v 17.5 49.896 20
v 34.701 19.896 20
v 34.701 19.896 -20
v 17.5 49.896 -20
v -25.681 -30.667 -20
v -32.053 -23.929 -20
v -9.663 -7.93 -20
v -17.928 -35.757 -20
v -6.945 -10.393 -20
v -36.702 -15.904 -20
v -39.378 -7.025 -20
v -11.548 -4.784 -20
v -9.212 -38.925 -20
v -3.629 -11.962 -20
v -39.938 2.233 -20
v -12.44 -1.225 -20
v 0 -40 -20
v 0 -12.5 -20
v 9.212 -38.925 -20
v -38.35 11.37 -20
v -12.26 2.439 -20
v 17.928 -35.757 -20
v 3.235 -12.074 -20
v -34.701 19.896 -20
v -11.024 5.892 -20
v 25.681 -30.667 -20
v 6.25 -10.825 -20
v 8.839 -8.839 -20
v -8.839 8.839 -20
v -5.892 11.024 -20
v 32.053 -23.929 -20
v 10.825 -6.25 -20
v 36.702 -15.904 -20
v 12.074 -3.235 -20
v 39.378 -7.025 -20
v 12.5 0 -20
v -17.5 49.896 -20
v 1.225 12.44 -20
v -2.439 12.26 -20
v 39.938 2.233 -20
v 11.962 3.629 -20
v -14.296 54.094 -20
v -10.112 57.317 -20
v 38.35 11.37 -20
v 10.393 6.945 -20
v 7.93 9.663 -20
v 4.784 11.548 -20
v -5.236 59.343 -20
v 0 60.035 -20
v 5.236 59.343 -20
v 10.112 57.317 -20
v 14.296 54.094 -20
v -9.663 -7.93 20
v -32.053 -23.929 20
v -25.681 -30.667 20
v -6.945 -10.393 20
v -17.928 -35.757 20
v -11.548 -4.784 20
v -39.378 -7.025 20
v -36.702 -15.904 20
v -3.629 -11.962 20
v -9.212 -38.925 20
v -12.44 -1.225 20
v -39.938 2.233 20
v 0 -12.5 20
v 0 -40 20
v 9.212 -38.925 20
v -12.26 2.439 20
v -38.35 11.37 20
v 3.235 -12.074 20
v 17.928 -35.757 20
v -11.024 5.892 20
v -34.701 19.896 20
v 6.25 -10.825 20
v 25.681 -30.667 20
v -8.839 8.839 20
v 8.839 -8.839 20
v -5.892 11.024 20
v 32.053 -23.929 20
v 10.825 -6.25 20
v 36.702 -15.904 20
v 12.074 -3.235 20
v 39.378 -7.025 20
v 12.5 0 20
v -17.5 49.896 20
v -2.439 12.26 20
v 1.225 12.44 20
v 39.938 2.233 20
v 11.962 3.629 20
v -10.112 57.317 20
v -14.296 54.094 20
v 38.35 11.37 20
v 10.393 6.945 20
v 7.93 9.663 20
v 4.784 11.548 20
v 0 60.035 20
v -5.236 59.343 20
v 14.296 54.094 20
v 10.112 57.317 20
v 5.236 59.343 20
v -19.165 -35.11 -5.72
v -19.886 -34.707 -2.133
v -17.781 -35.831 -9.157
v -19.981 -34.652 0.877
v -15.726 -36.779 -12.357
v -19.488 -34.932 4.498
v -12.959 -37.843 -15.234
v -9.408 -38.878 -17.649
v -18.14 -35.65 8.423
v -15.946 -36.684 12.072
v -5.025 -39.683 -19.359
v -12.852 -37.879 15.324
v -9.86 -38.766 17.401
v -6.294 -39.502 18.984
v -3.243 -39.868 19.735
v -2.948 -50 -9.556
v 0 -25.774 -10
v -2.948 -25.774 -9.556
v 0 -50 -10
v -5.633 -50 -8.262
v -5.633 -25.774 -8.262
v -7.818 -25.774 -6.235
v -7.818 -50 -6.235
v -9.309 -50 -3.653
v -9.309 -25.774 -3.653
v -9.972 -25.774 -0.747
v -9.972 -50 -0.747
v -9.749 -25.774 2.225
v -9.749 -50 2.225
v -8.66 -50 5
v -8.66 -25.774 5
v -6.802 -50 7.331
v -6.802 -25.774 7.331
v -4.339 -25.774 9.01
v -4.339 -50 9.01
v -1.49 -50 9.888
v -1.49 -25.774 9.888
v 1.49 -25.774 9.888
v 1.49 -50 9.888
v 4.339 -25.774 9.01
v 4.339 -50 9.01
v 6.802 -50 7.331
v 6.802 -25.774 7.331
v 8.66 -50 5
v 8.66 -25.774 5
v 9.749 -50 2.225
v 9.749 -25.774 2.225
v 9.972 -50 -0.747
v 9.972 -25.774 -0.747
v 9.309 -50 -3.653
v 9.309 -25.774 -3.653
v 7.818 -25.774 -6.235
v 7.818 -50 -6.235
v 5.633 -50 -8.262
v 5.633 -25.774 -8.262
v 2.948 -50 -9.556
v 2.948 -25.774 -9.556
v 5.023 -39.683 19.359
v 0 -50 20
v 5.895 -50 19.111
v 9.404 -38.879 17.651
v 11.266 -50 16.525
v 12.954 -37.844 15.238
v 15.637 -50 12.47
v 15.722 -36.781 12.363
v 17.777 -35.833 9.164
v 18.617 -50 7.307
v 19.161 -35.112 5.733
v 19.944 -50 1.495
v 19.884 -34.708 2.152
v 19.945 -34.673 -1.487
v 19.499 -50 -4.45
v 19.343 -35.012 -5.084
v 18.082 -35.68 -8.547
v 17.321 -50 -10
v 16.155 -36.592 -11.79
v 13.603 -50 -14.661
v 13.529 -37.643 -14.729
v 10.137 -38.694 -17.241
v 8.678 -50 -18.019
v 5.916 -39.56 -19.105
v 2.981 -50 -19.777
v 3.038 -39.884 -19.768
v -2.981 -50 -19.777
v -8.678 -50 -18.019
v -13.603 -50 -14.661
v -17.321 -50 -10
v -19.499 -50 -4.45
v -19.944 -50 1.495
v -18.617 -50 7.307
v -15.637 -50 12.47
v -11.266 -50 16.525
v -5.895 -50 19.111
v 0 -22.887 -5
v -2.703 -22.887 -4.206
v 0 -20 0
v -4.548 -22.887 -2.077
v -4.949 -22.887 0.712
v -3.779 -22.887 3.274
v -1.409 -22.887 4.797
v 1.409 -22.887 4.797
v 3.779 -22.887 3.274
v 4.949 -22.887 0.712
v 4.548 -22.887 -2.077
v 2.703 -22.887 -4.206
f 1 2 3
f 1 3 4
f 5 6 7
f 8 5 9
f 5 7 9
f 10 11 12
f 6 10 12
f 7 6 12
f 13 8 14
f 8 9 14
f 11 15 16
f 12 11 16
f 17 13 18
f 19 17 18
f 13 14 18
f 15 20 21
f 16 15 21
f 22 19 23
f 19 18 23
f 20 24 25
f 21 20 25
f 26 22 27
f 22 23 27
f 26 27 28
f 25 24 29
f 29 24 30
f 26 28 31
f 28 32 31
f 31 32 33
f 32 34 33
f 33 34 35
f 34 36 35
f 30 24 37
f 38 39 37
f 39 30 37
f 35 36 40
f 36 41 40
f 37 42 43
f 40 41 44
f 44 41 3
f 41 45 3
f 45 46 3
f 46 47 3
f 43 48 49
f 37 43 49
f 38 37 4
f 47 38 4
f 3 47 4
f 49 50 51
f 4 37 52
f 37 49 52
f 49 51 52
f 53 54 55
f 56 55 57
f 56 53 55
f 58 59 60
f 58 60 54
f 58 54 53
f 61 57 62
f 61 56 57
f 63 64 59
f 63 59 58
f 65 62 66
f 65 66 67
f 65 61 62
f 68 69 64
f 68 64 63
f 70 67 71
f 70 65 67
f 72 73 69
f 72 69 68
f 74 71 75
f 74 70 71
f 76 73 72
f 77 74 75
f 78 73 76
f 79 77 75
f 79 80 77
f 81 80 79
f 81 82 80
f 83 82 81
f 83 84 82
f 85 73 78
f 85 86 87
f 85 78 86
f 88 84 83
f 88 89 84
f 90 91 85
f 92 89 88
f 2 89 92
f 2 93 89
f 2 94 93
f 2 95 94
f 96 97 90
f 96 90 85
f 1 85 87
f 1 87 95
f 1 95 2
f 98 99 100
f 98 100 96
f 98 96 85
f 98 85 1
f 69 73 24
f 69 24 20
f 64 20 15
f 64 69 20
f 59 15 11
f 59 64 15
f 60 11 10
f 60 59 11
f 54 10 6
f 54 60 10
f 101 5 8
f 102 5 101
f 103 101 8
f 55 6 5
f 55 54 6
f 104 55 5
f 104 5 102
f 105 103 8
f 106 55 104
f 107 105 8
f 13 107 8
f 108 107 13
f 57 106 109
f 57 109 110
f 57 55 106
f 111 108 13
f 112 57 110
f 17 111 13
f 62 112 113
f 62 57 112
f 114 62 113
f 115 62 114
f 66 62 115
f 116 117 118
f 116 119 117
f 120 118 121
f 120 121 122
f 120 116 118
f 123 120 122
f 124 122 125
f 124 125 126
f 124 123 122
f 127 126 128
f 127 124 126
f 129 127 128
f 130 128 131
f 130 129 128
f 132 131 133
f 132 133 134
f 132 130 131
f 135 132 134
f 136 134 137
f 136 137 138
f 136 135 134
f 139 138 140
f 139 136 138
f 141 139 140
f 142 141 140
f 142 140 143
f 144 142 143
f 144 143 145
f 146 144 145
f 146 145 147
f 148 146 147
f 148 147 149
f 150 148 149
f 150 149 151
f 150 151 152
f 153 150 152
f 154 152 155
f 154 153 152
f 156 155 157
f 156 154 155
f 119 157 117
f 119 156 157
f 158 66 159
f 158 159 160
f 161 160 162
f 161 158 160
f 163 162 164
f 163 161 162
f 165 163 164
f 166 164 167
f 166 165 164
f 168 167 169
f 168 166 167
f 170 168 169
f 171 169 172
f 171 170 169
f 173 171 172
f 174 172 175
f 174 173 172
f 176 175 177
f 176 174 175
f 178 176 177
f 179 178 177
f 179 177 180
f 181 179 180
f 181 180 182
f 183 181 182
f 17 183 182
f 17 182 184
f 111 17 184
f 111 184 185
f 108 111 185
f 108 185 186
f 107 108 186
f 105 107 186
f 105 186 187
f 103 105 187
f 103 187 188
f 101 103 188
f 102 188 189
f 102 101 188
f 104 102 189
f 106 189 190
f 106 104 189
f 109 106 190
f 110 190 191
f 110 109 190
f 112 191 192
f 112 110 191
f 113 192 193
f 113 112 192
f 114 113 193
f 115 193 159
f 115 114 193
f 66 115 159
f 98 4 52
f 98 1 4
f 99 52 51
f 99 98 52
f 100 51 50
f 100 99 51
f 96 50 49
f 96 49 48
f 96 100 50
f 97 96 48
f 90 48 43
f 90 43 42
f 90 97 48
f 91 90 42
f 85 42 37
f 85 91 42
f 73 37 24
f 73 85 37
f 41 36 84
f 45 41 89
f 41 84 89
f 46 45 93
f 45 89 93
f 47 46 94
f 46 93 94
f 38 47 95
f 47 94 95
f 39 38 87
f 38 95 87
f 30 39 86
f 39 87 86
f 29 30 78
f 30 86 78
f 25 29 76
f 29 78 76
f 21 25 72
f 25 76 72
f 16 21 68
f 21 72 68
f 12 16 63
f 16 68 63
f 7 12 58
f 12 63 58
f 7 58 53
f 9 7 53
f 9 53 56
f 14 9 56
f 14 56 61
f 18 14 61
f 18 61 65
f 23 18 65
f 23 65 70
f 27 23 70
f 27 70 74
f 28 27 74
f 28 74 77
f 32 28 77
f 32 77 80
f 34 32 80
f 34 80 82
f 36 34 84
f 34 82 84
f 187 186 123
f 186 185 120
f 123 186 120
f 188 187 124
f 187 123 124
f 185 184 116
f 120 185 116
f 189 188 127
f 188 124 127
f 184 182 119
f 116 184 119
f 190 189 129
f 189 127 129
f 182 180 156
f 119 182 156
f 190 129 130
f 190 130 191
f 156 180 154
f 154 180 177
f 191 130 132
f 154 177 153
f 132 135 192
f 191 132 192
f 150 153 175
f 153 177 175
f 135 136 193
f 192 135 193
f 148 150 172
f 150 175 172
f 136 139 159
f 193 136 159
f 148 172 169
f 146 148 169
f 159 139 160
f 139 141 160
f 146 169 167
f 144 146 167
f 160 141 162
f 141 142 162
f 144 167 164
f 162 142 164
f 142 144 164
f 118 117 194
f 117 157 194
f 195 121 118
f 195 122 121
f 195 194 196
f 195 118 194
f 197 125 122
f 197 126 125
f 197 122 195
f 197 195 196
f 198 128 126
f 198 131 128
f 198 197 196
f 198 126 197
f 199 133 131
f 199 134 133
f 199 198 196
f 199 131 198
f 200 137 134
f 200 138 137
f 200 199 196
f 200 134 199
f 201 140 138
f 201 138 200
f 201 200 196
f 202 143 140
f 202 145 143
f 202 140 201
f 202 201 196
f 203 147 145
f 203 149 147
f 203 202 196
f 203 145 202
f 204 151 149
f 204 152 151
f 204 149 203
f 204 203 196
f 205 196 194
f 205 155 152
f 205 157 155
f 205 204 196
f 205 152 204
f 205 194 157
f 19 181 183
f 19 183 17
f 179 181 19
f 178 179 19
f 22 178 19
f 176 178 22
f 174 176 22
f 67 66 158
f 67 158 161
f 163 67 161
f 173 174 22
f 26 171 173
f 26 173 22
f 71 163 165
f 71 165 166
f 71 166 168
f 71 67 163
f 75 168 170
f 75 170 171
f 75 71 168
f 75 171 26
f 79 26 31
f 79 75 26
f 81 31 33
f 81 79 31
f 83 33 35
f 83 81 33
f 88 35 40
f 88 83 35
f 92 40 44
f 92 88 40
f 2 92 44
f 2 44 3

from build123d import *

# Parameters (mm, degrees)
BOSS_EXTRU_1_DEPTH      = 20
ESQUISSE2_R             = 20
BOSS_EXTRU_2_DEPTH      = 50
ESQUISSE3_R             = 12.5
ENL_V_MAT_EXTRU_1_DEPTH = 83.487366196


with BuildPart() as part:
    # Esquisse1 → Boss.-Extru.1 (new, symmetric)
    with BuildSketch(Plane.XY):
        with BuildLine():
            Line((-17.5, 49.896071292), (-34.700811909, 19.896071292))
            ThreePointArc((-34.700811909, 19.896071292), (0, -40), (34.700811909, 19.896071292))
            Line((34.700811909, 19.896071292), (17.5, 49.896071292))
            ThreePointArc((17.5, 49.896071292), (0, 60.034703013), (-17.5, 49.896071292))
        make_face()
    extrude(amount=BOSS_EXTRU_1_DEPTH, both=True)

    # Esquisse2 → Boss.-Extru.2 (add)
    with BuildSketch(Plane(origin=(0, 0, 0), x_dir=(1, 0, 0), z_dir=(0, 1, 0))):
        with Locations(Location((0, 0, 0), (0, 0, 270))):
            Circle(ESQUISSE2_R)
    extrude(amount=-BOSS_EXTRU_2_DEPTH)

    # Esquisse3 → Enlèv. mat.-Extru.1 (cut, through all)
    with BuildSketch(Plane.XY.offset(20)):
        Circle(ESQUISSE3_R)
    extrude(amount=-ENL_V_MAT_EXTRU_1_DEPTH, mode=Mode.SUBTRACT)

    # Esquisse5 → Enlèvement de matière-Révolution1 (revolve, cut)
    with BuildSketch(Plane.XY, mode=Mode.PRIVATE) as enl_vement_de_mati_re_r_volution1_sk:
        Polygon((0, -50), (0, -20), (10, -25.773502692), (10, -50), align=None)
    revolve(enl_vement_de_mati_re_r_volution1_sk.sketch.rotate(Axis((0, -50, 0), (0, 1, 0)), 90), axis=Axis((0, -50, 0), (0, 1, 0)), mode=Mode.SUBTRACT)


solid = part.part
